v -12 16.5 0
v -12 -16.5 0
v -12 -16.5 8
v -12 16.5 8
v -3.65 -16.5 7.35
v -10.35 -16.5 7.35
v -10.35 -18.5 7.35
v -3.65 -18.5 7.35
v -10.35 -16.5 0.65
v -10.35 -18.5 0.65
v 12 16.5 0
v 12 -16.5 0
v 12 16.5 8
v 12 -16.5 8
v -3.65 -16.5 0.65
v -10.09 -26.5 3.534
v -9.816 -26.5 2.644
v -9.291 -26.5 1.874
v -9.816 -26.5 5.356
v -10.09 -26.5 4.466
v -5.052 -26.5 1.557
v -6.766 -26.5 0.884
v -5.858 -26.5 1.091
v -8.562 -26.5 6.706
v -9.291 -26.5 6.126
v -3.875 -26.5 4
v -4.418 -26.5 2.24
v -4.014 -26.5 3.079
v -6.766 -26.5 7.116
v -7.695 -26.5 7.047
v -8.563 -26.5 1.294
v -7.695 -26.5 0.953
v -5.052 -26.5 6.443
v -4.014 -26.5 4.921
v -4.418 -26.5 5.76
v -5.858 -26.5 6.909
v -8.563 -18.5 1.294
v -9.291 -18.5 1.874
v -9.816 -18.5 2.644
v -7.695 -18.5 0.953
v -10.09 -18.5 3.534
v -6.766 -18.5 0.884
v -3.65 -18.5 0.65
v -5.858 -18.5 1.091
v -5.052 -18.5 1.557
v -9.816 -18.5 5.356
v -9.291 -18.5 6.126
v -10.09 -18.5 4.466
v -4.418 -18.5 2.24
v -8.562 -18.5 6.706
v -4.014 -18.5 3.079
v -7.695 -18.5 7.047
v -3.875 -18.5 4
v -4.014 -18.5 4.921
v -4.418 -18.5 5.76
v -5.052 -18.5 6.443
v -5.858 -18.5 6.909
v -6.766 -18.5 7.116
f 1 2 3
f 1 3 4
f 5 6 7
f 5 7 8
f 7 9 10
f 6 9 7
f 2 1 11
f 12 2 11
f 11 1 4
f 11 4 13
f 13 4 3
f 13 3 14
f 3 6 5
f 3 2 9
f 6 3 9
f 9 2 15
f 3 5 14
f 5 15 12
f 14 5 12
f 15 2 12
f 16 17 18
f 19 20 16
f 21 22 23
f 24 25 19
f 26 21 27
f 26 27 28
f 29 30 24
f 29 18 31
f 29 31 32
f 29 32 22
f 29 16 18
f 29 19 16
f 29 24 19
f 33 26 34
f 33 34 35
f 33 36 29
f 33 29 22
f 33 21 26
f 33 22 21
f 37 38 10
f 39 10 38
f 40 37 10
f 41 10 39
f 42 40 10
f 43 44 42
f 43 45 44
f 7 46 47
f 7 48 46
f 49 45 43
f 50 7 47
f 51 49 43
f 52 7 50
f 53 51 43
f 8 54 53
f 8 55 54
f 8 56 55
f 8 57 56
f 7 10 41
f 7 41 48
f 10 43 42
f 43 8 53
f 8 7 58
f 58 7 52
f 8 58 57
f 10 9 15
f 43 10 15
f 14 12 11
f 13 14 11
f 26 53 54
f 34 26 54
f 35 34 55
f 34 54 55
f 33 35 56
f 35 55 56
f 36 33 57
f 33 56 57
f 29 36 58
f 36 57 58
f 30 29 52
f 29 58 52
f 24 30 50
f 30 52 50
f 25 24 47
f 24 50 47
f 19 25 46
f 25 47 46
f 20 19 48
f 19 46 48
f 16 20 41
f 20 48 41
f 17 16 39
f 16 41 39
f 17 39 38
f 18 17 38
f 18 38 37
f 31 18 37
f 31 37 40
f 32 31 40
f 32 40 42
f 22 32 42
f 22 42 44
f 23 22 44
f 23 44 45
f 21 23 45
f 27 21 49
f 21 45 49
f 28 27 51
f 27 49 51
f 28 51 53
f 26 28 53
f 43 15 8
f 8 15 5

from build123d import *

# Parameters (mm, degrees)
F0_W     = 24
F0_H     = 33
F1_DEPTH = 8
F2_W     = 6.7
F2_H     = 6.7
F3_DEPTH = 2
F4_R     = 3.125
F5_DEPTH = 8


with BuildPart() as f1:
    # F0 (on Top) → F1 (new body)
    with BuildSketch(Plane.XY):
        Rectangle(F0_W, F0_H)
    extrude(amount=F1_DEPTH)

    # F2 (on face) → F3 (join)
    with BuildSketch(Plane.XZ.offset(16.5)):
        with Locations((-7, 4)):
            Rectangle(F2_W, F2_H)
    extrude(amount=F3_DEPTH)

    # F4 (on face) → F5 (join)
    with BuildSketch(Plane.XZ.offset(18.5)):
        with Locations((-7, 4)):
            Circle(F4_R)
    extrude(amount=F5_DEPTH)


solid = f1.part
